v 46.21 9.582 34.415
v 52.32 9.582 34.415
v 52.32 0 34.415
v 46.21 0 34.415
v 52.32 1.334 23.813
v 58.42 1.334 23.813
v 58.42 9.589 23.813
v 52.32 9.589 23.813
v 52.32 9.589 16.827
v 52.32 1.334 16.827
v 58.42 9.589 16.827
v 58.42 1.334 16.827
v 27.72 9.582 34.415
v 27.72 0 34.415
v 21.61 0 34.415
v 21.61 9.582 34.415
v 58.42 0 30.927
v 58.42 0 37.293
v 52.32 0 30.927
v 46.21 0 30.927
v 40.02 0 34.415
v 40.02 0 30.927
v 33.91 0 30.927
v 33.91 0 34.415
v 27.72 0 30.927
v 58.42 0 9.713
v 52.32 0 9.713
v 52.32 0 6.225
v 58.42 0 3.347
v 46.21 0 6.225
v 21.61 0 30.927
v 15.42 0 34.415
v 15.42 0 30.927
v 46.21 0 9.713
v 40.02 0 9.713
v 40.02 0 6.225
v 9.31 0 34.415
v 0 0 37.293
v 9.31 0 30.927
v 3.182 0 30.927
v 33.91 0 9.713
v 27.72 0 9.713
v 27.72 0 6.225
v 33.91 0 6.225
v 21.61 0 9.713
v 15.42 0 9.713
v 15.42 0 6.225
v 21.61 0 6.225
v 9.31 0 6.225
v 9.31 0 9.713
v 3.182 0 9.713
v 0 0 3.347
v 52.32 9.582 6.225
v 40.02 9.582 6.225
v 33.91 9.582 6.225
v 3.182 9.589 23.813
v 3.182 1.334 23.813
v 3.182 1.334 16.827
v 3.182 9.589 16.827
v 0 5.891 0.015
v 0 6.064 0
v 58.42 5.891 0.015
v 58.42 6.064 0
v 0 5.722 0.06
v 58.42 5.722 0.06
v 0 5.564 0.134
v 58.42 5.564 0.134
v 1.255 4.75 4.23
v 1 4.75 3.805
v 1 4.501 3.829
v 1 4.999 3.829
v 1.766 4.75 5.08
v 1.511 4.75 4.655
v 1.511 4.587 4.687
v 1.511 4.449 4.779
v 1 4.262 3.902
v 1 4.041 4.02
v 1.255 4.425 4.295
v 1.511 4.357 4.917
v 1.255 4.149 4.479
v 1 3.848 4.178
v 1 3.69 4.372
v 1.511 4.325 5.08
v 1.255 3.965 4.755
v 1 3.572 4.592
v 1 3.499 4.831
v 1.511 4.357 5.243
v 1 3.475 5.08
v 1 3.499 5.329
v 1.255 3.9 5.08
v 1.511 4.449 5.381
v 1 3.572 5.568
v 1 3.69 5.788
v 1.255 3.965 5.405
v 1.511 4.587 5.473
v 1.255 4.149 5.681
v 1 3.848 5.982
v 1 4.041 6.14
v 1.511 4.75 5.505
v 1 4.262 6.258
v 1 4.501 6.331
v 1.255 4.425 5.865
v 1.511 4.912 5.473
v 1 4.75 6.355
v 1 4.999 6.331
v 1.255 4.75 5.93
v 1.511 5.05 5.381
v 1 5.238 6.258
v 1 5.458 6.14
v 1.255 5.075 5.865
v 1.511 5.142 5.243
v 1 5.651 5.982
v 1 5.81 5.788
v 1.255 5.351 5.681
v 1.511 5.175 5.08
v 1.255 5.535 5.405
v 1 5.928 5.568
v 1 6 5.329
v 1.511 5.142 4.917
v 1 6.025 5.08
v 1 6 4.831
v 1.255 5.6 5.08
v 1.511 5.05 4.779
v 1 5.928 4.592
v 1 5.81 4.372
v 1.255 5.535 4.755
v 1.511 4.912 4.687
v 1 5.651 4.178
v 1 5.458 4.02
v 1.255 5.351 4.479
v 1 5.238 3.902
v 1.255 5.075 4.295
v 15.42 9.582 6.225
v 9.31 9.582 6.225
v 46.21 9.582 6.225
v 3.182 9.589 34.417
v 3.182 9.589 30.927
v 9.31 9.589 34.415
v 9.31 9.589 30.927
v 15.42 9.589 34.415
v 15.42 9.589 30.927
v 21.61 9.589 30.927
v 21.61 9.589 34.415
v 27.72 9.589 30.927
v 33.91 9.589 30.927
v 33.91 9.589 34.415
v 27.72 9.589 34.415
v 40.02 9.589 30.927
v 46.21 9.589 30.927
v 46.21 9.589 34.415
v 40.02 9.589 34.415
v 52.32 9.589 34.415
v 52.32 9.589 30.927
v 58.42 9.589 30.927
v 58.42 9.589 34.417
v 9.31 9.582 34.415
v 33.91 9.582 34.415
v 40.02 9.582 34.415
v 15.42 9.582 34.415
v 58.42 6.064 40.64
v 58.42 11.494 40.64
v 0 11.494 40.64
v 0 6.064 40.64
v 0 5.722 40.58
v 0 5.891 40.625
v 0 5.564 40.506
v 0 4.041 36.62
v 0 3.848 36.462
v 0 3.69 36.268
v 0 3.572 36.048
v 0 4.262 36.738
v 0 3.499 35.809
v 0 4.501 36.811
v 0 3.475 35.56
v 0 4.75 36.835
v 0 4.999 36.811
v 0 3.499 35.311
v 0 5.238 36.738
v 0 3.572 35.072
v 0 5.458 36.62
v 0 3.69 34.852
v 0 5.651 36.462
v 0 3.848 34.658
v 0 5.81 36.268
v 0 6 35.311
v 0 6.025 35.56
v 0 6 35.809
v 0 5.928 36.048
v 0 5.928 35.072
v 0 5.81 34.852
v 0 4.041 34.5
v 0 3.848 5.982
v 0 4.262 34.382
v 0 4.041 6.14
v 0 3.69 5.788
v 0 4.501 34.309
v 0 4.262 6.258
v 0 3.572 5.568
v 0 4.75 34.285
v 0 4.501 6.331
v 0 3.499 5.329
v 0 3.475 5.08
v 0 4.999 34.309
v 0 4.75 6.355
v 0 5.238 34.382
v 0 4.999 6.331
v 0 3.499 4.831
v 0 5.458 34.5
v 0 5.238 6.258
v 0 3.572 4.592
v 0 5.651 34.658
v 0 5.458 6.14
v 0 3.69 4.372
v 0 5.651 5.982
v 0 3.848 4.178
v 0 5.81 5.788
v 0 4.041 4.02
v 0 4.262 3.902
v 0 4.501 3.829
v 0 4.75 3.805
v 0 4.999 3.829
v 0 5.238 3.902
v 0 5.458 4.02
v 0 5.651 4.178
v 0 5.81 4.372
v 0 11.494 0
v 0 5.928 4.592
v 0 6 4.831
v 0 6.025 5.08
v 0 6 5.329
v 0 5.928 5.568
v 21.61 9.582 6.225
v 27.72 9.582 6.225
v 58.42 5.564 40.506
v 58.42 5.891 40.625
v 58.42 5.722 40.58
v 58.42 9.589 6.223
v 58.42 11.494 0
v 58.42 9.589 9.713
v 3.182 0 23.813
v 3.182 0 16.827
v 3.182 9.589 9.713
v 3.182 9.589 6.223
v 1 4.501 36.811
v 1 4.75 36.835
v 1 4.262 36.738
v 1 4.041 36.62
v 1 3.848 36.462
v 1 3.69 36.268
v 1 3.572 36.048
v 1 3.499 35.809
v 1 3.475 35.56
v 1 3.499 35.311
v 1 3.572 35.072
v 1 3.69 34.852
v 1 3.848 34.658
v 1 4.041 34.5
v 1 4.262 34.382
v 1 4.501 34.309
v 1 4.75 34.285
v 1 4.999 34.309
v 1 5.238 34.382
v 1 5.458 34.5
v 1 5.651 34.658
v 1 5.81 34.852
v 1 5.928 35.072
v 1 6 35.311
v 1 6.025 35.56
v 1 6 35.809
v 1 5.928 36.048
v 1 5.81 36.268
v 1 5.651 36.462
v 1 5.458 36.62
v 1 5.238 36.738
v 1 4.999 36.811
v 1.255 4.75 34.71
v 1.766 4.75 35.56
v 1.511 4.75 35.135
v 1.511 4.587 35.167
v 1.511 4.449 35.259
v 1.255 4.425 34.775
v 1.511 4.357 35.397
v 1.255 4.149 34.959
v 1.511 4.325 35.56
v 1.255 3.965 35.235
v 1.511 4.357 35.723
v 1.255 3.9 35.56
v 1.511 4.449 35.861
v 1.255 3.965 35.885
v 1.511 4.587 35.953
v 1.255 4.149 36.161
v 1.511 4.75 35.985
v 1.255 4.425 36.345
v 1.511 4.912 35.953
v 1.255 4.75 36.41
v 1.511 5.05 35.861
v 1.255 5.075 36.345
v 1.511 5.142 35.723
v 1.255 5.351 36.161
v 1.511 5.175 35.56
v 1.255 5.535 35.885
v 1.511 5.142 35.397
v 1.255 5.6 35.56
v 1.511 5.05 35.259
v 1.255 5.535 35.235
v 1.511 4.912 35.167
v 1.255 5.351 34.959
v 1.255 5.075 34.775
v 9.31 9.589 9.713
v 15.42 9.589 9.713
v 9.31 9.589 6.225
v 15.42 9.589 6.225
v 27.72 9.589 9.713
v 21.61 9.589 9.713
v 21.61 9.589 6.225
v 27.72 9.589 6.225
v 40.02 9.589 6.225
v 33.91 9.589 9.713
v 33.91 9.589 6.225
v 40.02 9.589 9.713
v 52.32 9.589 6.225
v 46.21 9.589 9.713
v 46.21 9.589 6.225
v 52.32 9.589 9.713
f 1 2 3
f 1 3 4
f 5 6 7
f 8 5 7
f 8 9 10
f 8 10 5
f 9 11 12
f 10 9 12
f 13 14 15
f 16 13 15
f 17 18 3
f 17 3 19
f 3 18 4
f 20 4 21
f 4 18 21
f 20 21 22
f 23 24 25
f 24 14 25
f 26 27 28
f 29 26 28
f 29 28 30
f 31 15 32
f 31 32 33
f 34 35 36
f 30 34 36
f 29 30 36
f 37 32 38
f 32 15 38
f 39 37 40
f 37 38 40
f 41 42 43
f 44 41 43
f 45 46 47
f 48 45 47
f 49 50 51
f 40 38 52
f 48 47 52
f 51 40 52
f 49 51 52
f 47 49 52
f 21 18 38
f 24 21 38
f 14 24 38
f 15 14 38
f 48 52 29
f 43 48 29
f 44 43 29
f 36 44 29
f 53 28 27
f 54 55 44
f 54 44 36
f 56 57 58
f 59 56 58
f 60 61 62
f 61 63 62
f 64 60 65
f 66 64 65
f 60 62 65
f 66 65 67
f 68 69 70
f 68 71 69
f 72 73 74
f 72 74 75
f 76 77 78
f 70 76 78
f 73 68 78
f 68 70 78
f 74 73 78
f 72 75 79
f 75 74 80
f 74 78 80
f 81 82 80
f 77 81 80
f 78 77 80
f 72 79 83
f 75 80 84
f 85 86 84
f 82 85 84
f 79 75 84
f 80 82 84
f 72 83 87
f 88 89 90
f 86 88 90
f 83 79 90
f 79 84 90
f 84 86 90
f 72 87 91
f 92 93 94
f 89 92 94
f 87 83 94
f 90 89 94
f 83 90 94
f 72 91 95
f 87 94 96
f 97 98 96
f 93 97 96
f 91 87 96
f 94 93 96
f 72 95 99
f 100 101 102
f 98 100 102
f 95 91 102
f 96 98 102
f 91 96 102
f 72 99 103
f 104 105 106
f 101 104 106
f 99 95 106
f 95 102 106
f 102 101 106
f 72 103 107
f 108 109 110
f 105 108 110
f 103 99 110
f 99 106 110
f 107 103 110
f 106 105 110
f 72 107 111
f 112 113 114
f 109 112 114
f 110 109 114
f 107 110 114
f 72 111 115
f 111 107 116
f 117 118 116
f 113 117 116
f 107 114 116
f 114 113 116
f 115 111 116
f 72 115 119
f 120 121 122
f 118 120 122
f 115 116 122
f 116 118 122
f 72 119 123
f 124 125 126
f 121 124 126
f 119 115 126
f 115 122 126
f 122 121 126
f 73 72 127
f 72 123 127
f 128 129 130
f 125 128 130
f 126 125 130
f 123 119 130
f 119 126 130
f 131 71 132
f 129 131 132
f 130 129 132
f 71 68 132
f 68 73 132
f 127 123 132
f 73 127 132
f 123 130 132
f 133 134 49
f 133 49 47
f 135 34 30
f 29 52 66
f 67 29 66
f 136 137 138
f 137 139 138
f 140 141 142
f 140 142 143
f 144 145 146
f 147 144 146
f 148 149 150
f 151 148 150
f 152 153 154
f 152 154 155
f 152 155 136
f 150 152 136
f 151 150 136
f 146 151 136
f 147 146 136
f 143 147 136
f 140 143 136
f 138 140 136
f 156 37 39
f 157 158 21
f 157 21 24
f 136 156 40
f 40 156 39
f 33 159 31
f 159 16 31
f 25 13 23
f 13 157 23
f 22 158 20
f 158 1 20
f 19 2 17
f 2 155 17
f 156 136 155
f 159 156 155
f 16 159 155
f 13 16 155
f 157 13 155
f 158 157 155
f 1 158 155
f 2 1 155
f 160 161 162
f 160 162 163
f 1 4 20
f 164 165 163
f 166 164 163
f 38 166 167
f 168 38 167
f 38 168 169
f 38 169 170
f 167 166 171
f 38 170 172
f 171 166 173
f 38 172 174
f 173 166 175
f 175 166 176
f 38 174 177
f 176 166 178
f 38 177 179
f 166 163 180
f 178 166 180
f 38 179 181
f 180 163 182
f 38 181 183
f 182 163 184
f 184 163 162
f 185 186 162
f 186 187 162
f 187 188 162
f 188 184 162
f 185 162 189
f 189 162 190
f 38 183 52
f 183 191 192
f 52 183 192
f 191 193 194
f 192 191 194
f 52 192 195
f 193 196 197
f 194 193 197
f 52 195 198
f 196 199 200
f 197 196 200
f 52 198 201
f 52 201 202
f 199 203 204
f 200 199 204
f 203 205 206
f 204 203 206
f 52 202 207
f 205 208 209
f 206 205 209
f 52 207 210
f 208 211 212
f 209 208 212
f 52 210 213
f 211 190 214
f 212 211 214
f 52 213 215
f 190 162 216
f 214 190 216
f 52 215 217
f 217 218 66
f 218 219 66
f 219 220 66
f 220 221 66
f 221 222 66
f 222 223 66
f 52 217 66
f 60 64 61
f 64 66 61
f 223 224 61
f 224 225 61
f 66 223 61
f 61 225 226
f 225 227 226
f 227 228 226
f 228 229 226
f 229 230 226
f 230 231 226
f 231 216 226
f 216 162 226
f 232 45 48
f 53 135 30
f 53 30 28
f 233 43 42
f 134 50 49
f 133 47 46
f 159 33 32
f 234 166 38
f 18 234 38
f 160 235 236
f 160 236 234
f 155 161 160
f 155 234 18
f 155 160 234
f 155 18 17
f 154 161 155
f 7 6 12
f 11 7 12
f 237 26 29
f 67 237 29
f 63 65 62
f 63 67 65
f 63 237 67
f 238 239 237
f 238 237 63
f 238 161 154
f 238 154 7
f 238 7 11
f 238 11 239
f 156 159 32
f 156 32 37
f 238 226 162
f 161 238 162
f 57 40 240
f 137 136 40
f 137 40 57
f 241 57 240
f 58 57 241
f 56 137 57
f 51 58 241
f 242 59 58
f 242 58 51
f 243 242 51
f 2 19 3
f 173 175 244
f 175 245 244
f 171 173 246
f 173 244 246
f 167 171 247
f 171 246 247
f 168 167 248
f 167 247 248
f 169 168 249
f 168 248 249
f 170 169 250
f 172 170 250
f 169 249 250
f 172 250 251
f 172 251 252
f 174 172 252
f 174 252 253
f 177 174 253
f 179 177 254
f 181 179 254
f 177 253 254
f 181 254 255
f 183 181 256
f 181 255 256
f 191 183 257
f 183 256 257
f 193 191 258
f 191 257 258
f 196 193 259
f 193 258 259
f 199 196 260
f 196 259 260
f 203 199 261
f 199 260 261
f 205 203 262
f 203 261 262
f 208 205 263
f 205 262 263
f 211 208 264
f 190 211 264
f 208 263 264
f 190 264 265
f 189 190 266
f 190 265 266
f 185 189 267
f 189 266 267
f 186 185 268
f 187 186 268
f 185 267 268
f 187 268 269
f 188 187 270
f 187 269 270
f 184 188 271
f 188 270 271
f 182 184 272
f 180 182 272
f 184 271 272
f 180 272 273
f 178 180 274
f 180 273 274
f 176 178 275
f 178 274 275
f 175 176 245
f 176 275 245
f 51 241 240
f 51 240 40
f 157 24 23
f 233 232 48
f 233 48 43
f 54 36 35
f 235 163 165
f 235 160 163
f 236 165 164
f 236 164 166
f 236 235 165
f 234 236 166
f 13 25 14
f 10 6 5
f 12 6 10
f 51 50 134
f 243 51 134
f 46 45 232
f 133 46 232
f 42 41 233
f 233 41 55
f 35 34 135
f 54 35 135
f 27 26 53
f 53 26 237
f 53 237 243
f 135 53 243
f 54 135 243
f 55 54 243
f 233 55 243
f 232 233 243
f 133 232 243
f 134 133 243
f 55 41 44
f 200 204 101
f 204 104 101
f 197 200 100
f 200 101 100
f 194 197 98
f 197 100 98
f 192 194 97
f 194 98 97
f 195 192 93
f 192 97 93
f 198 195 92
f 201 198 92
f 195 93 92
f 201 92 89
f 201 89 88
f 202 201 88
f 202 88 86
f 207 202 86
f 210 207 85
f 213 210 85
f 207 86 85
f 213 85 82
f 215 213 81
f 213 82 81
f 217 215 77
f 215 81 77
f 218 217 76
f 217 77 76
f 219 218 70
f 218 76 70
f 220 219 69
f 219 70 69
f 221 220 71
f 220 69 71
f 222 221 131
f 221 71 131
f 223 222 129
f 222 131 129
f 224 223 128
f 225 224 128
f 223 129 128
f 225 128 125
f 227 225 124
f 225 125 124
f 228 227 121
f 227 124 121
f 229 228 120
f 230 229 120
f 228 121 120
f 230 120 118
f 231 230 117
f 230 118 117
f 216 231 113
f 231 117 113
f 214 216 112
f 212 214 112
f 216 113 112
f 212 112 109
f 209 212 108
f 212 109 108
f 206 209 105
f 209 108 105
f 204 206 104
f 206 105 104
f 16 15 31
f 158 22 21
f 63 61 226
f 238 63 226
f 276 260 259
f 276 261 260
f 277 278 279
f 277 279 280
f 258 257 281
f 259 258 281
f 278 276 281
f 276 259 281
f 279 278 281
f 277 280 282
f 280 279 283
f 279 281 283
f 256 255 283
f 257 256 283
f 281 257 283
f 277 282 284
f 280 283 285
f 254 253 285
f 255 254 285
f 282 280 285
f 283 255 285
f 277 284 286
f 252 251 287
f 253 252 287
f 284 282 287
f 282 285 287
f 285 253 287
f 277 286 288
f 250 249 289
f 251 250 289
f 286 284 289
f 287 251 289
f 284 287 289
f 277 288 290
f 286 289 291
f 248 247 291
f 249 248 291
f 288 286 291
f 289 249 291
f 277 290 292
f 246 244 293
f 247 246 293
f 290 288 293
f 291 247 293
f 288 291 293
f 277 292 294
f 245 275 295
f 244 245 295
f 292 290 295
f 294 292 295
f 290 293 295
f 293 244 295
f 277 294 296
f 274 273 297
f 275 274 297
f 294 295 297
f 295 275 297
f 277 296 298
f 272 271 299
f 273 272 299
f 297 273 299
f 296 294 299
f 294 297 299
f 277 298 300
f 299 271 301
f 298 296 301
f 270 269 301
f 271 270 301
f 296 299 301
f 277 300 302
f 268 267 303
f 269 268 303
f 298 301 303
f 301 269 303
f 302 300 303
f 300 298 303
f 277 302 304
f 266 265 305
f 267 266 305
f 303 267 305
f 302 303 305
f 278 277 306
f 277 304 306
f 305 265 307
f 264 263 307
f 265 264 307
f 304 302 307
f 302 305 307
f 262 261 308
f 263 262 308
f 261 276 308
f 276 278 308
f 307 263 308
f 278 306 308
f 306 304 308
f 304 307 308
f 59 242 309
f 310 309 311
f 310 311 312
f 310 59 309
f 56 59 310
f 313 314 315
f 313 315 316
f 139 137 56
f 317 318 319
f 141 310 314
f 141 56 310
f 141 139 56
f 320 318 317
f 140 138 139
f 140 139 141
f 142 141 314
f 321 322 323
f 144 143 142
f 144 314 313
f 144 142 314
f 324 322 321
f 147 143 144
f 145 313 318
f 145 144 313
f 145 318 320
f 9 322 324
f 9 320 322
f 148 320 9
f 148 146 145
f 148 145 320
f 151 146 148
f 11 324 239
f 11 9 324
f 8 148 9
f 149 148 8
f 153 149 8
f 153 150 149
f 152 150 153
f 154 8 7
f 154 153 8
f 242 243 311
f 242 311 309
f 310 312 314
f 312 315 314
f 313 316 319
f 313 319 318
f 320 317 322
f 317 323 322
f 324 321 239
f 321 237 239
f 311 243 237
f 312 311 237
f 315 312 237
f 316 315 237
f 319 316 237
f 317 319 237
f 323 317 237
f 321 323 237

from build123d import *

# Parameters (mm, degrees)
EXTRUDE_340_DEPTH        = 58.419998735
SKETCH_393_W             = 6.985001266
SKETCH_393_H             = 1.333500259
CUT_EXTRUDE_2374_DEPTH   = 55.237557
CUT_EXTRUDE_START        = -9.588525
CUT_EXTRUDE_2430_DEPTH   = 9.588525
SKETCH_5_W               = 6.1
SKETCH_5_H               = 6.985001266
CUT_EXTRUDE_2514_DEPTH   = 1.333524
HOLE_WIZARD_M2_5_1_D     = 2.55
HOLE_WIZARD_M2_5_1_DEPTH = 1
HOLE_WIZARD_M2_5_1_TIP   = 0.766097289
FILLET_1_R               = 1


with BuildPart() as part:
    # Extrude 340: read off the stored shape, not the designer's step
    # Extrude 340 outline → Extrude 340 (new body)
    with BuildSketch(Plane(origin=(0, 0, 0), x_dir=(0, 0, -1), z_dir=(1, 0, 0))):
        Polygon((0, 5.796468934), (0, 11.493524536), (-40.640000254, 11.493524536), (-40.640000254, 5.796468934), (-37.29345587, 0), (-3.346544384, 0), align=None)
    extrude(amount=EXTRUDE_340_DEPTH)

    # Sketch 393 → Cut-Extrude 2374 (cut)
    with BuildSketch(Plane(origin=(58.419998735, 0, 0), x_dir=(0, 0, -1), z_dir=(1, 0, 0))):
        Polygon((-23.81250076, 2.4214e-05), (-23.81250076, 1.333524473), (-23.81250076, 9.588524699), (-34.416999668, 9.588524699), (-30.927071348, 2.4214e-05), align=None)
        with Locations((-20.320000127, 0.666774343)):
            Rectangle(SKETCH_393_W, SKETCH_393_H)
        Polygon((-16.827499494, 9.588524699), (-16.827499494, 1.333524473), (-16.827499494, 2.4214e-05), (-9.712928906, 2.4214e-05), (-6.223000586, 9.588524699), align=None)
    extrude(amount=-CUT_EXTRUDE_2374_DEPTH, mode=Mode.SUBTRACT)

    # Sketch 1050 → Cut-Extrude 2430 (cut)
    with BuildSketch(Plane.XZ.offset(CUT_EXTRUDE_START)):
        Polygon((58.419998735, 23.81250076), (58.419998735, 30.927071348), (52.319998735, 30.927071348), (52.319998735, 34.414733996), (46.209998735, 34.414733996), (46.209998735, 30.927071348), (40.019998735, 30.927071348), (40.019998735, 34.414733996), (33.909998735, 34.414733996), (33.909998735, 30.927071348), (27.719998735, 30.927071348), (27.719998735, 34.414733996), (21.609998735, 34.414733996), (21.609998735, 30.927071348), (15.419998735, 30.927071348), (15.419998735, 34.414733996), (9.309998735, 34.414733996), (9.309998735, 30.927071348), (3.182441867, 30.927071348), (3.182441867, 9.712928906), (9.309998735, 9.712928906), (9.309998735, 6.225266258), (15.419998735, 6.225266258), (15.419998735, 9.712928906), (21.609998735, 9.712928906), (21.609998735, 6.225266258), (27.719998735, 6.225266258), (27.719998735, 9.712928906), (33.909998735, 9.712928906), (33.909998735, 6.225266258), (40.019998735, 6.225266258), (40.019998735, 9.712928906), (46.209998735, 9.712928906), (46.209998735, 6.225266258), (52.319998735, 6.225266258), (52.319998735, 9.712928906), (58.419998735, 9.712928906), (58.419998735, 16.827499494), (52.319998735, 16.827499494), (52.319998735, 23.81250076), align=None)
    extrude(amount=CUT_EXTRUDE_2430_DEPTH, mode=Mode.SUBTRACT)


with BuildPart() as cut_extrude_2430_piece_1:
    # of the separate pieces the step leaves, piece 1, a body of its own (cut_extrude_2430_pieces)
    add(part.part.solids().sort_by_distance((0, 5.796468934, 0))[0])

    # M2.5 螺旋的螺纹孔钻头1
    with Locations(Plane(origin=(0, 4.749824371, 5.079999834), x_dir=(0, 0, -1), z_dir=(-1, 0, 0))):
        with Locations((0, 0), (-30.480000761, 2.389e-06)):
            Hole(HOLE_WIZARD_M2_5_1_D / 2, depth=HOLE_WIZARD_M2_5_1_DEPTH)
            with Locations((0, 0, -(HOLE_WIZARD_M2_5_1_DEPTH + HOLE_WIZARD_M2_5_1_TIP / 2))):  # 118° drill point
                Cone(0, HOLE_WIZARD_M2_5_1_D / 2, HOLE_WIZARD_M2_5_1_TIP, mode=Mode.SUBTRACT)

    # 圆角1
    fillet_1_edges = [cut_extrude_2430_piece_1.edges().sort_by_distance(p)[0] for p in [
        (29.209999368, 5.796468934, 0),
        (29.209999368, 5.796468934, 40.640000254),
    ]]
    fillet(fillet_1_edges, radius=FILLET_1_R)


with BuildPart() as cut_extrude_2430_piece_2:
    # of the separate pieces the step leaves, piece 2, a body of its own (cut_extrude_2430_pieces)
    add(part.part.solids().sort_by_distance((58.419998735, 0, 23.81250076))[0])

    # 顶面开口切面<5> → Cut-Extrude 2514 (cut)
    with BuildSketch(Plane.XZ):
        with Locations((55.369998735, 20.320000127)):
            Rectangle(SKETCH_5_W, SKETCH_5_H)
    extrude(amount=-CUT_EXTRUDE_2514_DEPTH, mode=Mode.SUBTRACT)


solid = cut_extrude_2430_piece_1.part
